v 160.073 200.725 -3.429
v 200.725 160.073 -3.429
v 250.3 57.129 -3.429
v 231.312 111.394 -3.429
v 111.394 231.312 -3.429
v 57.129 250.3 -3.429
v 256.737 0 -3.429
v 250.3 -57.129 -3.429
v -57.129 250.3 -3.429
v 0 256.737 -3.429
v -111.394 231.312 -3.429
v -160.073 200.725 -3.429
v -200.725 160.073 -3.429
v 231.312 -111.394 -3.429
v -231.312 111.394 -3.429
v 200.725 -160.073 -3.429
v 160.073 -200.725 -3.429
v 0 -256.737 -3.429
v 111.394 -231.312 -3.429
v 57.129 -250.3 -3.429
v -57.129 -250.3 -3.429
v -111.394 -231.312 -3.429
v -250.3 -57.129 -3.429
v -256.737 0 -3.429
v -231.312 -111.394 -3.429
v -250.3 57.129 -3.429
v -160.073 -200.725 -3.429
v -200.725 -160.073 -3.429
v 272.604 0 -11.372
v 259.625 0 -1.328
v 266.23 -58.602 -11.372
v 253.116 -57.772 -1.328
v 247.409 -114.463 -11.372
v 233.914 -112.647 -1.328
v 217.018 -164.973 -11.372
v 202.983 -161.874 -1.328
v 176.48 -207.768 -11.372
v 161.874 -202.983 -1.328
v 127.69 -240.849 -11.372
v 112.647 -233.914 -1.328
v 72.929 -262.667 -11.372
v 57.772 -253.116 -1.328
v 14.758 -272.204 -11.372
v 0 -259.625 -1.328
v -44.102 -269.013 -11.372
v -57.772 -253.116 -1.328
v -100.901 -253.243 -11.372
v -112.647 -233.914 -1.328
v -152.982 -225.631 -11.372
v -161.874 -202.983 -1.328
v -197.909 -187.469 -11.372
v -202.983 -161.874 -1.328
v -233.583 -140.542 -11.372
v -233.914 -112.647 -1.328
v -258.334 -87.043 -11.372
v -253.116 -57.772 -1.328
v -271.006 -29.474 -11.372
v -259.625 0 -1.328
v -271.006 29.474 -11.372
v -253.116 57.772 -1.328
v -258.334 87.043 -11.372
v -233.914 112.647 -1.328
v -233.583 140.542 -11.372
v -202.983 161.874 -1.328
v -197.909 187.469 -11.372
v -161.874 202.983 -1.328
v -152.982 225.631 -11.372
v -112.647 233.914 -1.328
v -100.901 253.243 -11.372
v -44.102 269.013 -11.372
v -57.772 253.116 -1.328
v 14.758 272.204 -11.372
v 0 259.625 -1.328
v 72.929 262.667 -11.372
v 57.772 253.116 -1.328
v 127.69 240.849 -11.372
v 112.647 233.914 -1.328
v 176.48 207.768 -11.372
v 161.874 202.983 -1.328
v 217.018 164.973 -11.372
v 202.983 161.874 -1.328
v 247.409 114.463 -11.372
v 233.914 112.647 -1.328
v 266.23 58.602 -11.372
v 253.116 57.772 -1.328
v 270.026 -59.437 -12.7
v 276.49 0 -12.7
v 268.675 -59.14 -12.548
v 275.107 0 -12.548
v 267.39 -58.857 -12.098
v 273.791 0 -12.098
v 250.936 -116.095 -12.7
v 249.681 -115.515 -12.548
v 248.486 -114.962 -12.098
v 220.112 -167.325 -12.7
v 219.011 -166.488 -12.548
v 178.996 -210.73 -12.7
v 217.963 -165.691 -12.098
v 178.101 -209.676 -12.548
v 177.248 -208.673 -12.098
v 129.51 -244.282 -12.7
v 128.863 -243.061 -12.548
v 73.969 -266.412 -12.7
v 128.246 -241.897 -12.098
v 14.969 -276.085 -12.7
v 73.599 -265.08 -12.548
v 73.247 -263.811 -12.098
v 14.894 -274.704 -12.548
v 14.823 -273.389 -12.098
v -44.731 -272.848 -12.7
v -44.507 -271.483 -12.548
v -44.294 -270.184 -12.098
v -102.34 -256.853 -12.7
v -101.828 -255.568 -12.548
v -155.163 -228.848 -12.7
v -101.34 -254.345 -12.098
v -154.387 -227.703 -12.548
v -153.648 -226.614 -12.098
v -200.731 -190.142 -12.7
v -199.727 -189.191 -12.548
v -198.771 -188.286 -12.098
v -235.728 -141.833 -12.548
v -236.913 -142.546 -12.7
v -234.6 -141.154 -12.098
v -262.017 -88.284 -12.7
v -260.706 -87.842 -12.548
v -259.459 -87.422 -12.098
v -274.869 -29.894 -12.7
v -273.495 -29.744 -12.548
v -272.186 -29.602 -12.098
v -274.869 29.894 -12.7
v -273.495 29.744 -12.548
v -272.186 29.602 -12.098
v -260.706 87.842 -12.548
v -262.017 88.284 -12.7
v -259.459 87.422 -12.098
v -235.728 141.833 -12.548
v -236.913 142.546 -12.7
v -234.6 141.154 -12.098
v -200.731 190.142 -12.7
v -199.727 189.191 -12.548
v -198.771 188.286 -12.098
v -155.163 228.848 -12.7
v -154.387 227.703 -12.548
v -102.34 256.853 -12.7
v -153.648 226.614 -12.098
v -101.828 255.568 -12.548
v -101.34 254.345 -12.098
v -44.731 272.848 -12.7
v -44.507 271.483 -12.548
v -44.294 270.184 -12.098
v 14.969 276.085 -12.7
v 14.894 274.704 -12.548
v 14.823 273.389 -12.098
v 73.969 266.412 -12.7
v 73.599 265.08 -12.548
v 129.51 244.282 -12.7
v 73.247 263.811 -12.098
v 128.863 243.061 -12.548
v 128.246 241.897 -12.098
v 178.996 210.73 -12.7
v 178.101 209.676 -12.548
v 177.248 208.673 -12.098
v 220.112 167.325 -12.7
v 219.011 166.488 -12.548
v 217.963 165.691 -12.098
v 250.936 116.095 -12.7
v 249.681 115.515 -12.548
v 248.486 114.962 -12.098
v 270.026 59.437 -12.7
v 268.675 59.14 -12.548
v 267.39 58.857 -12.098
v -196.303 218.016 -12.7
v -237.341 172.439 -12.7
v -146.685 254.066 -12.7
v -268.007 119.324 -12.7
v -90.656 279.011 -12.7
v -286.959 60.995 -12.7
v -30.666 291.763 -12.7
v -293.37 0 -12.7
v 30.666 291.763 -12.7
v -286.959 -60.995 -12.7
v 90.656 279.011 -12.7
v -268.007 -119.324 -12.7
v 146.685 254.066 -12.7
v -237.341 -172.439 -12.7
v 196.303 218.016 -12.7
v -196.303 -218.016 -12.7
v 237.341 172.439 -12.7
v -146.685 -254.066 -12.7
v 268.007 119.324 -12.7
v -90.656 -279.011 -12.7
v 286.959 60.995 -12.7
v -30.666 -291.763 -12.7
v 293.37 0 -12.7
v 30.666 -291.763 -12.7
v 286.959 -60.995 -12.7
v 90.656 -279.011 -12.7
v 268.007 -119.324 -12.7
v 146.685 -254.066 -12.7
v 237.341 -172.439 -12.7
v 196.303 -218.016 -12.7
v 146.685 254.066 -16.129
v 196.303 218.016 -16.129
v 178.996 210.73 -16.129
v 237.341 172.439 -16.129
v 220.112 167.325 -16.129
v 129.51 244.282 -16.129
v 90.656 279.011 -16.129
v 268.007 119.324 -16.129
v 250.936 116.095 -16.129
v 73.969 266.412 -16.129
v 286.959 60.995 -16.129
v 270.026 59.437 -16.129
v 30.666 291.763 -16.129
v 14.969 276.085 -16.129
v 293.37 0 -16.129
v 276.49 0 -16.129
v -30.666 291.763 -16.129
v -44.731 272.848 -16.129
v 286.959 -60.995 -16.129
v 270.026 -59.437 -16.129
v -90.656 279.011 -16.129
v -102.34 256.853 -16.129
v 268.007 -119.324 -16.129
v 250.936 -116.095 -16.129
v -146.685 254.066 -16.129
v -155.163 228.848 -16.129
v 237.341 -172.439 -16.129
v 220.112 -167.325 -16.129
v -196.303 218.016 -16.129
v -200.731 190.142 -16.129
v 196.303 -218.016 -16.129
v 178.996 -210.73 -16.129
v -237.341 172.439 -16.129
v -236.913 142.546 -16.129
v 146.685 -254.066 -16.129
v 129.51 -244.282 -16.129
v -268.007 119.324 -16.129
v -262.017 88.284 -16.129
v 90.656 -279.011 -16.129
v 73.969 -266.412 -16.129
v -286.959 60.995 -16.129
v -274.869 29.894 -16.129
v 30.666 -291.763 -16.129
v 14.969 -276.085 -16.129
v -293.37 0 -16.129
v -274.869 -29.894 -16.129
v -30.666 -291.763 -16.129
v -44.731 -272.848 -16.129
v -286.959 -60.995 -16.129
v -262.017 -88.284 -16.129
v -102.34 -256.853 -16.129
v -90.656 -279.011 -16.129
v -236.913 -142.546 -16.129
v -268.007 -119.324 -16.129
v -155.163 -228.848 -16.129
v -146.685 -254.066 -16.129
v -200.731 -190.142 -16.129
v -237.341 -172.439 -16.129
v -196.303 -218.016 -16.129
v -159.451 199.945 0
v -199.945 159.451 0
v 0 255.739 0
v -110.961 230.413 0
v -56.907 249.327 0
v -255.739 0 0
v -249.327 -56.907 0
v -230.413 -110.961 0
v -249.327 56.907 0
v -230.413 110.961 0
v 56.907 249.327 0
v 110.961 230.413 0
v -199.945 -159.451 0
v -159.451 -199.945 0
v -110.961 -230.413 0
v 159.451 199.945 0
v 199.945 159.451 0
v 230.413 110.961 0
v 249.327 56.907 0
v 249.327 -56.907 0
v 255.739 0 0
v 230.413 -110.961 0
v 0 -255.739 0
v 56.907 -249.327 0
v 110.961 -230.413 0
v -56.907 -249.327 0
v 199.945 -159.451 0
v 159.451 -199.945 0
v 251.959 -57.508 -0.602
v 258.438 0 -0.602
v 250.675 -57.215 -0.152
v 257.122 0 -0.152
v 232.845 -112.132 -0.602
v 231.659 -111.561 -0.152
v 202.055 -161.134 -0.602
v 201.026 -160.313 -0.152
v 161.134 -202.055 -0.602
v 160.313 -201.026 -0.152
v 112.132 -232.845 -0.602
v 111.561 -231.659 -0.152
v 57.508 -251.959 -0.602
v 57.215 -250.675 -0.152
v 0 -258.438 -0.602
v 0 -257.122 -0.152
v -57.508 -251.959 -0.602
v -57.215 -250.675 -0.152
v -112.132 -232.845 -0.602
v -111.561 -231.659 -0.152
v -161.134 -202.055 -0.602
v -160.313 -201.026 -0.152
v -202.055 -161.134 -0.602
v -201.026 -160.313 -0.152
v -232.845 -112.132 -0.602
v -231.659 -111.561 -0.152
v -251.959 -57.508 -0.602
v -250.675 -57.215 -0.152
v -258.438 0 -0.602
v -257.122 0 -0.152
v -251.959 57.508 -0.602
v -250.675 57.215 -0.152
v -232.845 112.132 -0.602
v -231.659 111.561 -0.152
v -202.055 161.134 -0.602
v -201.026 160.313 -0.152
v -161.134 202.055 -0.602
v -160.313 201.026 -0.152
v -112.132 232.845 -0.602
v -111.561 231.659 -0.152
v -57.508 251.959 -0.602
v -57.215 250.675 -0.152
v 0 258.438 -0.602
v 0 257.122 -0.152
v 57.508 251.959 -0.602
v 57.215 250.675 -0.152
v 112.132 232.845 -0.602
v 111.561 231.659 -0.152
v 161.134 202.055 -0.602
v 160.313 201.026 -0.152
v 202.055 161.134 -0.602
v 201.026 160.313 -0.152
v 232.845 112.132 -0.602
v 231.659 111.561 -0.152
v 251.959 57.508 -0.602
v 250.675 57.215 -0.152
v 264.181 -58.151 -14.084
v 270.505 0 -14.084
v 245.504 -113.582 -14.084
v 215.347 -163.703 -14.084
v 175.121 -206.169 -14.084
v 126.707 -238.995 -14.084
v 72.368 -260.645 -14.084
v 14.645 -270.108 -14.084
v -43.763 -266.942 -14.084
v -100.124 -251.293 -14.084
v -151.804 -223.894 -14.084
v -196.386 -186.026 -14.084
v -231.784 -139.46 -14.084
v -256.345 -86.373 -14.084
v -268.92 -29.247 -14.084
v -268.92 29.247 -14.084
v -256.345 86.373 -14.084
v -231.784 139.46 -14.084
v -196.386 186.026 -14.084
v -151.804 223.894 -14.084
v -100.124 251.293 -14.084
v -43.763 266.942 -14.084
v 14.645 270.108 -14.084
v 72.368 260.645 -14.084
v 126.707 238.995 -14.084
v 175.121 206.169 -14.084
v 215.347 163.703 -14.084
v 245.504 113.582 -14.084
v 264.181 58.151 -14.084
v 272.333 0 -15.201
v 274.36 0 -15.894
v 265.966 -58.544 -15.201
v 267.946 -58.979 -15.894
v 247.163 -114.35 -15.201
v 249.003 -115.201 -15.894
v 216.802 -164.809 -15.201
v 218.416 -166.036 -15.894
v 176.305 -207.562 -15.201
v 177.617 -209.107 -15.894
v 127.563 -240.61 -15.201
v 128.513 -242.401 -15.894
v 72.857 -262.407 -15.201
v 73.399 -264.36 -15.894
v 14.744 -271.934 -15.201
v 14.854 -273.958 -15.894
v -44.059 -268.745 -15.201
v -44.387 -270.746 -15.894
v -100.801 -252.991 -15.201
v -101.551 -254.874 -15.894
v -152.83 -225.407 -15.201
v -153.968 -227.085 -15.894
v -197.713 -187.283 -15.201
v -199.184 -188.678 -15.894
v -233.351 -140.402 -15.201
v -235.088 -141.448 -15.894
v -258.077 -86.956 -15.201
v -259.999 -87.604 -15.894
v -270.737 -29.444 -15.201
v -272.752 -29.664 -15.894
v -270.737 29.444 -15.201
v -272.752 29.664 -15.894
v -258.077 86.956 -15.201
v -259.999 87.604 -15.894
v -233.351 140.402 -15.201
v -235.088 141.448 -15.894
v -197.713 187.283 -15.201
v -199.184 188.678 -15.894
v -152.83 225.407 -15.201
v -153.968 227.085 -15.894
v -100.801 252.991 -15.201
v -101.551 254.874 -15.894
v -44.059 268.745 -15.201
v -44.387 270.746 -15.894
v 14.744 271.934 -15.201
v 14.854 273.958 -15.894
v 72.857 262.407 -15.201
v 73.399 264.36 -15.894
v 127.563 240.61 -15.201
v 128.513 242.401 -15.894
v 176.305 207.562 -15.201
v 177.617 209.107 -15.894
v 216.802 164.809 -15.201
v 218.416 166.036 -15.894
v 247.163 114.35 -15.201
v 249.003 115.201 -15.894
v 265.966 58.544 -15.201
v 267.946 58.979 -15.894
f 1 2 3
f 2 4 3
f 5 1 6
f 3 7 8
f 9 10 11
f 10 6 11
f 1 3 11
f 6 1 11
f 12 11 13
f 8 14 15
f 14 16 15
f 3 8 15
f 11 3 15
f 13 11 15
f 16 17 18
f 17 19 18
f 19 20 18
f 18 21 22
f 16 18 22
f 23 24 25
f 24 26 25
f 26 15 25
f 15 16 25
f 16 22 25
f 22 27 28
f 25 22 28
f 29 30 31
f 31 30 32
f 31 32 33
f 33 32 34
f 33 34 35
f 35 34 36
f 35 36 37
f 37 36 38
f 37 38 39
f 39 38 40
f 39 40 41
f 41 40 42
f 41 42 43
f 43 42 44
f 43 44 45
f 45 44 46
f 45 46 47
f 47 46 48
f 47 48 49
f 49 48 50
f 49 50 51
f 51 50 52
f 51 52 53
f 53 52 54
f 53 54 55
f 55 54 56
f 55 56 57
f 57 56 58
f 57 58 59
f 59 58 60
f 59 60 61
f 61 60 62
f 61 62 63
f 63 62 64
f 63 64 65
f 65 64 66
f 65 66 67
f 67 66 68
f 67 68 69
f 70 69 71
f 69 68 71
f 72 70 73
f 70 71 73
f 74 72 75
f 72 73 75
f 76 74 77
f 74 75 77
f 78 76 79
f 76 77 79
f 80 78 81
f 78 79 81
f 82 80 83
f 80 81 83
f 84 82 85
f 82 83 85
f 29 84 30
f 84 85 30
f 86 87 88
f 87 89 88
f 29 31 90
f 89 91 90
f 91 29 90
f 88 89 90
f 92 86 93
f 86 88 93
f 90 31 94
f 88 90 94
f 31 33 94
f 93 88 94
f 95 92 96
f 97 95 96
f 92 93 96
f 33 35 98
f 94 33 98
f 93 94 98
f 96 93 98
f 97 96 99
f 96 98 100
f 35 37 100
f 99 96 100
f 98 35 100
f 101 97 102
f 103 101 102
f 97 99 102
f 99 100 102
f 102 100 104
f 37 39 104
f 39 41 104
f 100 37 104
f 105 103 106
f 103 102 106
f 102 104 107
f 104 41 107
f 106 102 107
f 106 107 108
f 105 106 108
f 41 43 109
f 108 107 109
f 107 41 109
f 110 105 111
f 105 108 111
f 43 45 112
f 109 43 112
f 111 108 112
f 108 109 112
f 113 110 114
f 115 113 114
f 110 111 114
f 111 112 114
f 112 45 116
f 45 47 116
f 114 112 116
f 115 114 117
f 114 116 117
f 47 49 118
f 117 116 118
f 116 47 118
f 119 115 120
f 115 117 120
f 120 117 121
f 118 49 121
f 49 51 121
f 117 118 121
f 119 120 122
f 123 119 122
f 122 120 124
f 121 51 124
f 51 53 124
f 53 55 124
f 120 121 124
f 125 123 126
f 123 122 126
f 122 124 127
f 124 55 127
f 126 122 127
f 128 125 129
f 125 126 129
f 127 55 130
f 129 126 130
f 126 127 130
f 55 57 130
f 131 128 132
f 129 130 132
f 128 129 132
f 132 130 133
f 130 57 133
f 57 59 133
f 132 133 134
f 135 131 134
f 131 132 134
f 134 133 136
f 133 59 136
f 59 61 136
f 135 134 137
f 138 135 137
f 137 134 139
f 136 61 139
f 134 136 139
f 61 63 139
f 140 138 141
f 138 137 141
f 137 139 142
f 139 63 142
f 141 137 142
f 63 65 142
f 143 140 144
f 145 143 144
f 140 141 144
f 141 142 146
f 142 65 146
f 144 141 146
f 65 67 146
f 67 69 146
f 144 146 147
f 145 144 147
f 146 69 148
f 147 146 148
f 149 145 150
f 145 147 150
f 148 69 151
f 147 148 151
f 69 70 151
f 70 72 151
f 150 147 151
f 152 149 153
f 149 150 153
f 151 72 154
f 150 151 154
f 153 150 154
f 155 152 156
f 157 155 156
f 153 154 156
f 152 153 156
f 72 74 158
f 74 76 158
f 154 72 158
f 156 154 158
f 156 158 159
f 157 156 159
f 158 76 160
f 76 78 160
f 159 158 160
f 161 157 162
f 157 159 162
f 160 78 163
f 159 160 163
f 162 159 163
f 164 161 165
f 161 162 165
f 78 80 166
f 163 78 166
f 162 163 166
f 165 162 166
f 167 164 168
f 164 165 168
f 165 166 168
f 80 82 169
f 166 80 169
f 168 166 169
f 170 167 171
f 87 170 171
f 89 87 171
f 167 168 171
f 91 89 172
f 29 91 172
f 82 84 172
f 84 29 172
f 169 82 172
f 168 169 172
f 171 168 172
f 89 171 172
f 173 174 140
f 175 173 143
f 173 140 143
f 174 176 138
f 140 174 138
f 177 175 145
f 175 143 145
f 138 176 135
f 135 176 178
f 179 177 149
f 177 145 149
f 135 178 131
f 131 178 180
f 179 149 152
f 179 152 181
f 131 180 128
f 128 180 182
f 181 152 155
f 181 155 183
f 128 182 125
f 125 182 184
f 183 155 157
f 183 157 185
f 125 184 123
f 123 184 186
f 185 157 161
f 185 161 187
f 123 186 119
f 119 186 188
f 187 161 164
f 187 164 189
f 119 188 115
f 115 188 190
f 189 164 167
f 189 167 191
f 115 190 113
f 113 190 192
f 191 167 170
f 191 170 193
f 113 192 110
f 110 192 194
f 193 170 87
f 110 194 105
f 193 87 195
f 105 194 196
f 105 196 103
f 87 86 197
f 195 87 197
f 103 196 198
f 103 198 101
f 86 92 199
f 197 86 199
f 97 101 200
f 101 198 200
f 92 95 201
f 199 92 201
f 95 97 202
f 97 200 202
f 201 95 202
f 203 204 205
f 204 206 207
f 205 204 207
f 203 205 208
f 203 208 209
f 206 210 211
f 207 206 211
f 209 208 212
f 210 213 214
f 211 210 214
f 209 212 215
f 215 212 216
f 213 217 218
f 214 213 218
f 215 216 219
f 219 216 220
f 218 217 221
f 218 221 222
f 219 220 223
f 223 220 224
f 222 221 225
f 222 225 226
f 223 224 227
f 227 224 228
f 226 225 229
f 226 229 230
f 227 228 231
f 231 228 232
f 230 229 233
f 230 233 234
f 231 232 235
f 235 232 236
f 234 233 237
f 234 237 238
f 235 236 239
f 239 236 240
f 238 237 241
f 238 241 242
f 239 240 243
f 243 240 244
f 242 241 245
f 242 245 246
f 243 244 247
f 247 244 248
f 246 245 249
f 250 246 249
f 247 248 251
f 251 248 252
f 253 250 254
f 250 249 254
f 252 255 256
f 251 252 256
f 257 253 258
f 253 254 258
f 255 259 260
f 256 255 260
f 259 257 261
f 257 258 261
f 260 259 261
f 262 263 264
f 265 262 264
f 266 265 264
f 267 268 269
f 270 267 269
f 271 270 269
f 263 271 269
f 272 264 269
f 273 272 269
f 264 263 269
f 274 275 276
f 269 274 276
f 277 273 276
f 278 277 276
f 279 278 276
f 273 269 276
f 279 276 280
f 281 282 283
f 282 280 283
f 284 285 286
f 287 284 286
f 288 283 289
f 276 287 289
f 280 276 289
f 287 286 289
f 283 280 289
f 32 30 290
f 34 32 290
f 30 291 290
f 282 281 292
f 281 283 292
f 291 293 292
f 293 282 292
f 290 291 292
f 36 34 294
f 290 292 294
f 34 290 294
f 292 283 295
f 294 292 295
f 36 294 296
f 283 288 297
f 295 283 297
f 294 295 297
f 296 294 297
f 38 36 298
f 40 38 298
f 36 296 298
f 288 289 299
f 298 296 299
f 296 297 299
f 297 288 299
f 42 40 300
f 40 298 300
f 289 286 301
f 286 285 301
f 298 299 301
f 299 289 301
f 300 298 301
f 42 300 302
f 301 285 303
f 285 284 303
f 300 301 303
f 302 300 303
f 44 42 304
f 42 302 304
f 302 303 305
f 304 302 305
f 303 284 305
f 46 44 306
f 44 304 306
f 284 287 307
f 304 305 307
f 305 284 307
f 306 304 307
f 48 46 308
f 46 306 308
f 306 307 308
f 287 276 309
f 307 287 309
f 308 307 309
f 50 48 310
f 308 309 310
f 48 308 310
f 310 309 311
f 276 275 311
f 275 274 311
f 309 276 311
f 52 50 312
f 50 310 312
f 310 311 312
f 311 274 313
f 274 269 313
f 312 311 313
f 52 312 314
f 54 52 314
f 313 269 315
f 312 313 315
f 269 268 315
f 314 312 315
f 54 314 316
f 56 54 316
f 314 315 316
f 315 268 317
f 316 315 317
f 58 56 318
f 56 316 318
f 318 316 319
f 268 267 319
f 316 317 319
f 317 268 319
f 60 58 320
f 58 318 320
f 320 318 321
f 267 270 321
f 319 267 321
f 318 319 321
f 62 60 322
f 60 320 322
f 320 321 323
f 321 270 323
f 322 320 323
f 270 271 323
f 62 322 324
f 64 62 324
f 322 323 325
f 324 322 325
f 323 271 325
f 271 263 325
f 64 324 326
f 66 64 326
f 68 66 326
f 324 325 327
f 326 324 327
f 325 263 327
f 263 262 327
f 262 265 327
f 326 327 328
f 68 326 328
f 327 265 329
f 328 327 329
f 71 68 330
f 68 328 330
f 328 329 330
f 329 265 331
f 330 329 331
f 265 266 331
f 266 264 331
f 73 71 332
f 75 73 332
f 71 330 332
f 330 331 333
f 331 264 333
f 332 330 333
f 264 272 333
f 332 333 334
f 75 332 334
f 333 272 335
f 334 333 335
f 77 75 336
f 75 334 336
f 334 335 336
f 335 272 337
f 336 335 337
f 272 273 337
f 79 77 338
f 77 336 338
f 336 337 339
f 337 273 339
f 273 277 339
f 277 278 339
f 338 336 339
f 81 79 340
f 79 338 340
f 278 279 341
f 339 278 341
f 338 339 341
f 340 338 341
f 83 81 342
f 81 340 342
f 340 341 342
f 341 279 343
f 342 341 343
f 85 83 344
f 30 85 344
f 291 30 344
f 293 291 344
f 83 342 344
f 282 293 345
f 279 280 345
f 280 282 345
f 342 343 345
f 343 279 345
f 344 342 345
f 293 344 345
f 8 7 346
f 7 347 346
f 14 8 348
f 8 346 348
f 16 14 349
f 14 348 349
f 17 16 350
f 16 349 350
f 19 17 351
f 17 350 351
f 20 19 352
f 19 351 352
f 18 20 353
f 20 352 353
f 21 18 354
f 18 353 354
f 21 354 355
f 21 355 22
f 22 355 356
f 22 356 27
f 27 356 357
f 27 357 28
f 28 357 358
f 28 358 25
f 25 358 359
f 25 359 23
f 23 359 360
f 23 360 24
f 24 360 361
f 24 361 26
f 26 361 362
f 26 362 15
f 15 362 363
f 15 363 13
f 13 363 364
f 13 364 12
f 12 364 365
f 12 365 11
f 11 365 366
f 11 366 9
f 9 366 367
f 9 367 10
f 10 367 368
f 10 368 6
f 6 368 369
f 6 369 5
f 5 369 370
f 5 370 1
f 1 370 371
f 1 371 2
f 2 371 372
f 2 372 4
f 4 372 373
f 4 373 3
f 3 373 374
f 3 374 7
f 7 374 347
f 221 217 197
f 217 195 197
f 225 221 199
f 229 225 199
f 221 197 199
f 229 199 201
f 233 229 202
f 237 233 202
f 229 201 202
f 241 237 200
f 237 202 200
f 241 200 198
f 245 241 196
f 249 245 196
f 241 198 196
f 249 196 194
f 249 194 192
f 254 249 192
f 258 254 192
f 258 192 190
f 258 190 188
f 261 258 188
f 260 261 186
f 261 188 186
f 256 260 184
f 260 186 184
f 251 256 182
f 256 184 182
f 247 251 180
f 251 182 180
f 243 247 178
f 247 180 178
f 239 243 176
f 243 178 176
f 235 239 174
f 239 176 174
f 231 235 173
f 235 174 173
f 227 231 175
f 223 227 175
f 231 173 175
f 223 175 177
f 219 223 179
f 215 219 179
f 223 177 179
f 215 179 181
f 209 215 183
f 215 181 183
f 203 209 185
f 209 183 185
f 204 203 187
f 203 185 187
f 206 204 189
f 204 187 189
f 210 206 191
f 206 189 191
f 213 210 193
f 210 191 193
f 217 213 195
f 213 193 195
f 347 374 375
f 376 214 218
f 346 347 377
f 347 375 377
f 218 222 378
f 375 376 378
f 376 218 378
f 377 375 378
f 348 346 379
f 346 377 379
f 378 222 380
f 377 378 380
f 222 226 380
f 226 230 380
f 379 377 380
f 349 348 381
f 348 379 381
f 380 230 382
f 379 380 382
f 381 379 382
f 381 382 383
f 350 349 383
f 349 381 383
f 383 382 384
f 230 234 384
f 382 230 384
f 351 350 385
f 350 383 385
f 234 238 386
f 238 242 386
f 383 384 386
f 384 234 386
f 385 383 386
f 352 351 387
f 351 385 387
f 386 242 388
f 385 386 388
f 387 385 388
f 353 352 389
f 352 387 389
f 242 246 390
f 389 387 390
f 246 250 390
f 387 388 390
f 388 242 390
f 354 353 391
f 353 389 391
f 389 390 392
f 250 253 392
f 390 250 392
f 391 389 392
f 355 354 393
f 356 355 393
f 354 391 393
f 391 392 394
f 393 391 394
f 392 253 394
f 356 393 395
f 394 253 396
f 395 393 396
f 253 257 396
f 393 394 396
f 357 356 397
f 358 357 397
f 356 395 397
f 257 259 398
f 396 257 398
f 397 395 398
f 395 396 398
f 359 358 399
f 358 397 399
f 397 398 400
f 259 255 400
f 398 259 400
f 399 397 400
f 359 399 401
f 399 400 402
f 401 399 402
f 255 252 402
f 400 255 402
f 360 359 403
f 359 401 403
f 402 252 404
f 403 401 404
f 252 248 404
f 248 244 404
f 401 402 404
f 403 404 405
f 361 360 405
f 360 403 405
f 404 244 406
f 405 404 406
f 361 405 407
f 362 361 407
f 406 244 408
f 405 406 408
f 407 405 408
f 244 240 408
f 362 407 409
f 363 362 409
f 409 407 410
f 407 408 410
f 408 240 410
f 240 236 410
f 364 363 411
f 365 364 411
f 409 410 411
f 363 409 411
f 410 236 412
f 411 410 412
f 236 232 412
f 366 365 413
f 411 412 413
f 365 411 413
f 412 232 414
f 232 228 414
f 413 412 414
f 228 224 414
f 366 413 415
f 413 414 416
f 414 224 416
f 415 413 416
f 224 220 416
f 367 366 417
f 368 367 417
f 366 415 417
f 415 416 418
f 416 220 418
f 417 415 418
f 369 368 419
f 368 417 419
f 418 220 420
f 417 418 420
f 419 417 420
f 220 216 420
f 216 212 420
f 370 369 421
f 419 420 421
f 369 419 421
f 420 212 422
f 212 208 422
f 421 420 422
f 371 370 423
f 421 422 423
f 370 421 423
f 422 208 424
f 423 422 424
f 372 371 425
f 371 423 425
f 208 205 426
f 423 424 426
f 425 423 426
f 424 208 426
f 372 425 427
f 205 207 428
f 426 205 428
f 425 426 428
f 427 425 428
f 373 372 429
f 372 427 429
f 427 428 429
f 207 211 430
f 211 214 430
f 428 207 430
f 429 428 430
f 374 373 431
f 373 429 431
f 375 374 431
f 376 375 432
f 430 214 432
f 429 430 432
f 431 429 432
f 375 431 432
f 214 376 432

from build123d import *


with BuildPart() as f1:
    # F0 (on Front) → F1 (revolve)
    with BuildSketch(Plane.XZ):
        with BuildLine():
            Line((255.738805, 0), (0, 0))
            Line((0, 0), (0, -3.429))
            Line((0, -3.429), (256.737037, -3.429))
            Line((256.737037, -3.429), (270.505216, -14.083716))
            ThreePointArc((270.505216, -14.083716), (273.327727, -15.603563), (276.49007, -16.129))
            Line((276.49007, -16.129), (293.37, -16.129))
            Line((293.37, -16.129), (293.37, -12.7))
            Line((293.37, -12.7), (276.49007, -12.7))
            ThreePointArc((276.49007, -12.7), (274.4366, -12.358807), (272.603801, -11.371893))
            Line((272.603801, -11.371893), (259.625074, -1.328107))
            ThreePointArc((259.625074, -1.328107), (257.792275, -0.341193), (255.738805, 0))
        make_face()
    revolve(axis=Axis((0, 0, -1.7145), (0, 0, -1)))


solid = f1.part
